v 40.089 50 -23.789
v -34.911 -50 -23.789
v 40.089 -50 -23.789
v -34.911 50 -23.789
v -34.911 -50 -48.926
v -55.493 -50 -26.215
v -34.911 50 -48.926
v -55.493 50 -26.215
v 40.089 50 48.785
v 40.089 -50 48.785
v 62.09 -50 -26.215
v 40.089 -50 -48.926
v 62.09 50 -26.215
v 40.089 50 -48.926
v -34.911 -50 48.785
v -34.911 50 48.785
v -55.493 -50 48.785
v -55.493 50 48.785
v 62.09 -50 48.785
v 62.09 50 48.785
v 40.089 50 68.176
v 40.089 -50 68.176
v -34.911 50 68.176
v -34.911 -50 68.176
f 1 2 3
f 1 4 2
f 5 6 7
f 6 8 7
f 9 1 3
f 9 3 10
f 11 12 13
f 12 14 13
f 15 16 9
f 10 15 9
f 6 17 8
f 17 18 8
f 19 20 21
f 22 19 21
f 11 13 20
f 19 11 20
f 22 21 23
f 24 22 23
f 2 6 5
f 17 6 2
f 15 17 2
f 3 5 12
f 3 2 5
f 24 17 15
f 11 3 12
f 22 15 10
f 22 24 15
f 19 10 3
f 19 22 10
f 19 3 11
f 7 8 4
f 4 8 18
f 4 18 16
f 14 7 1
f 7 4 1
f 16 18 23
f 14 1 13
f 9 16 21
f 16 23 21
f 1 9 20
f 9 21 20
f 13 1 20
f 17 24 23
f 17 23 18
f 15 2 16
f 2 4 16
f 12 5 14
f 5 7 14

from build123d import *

# Parameters (mm, degrees)
F0_W          = 75
F0_H          = 72.5740331761
F1_DEPTH      = 50
F1_DEPTH_BACK = 50


with BuildPart() as f1:
    # F0 (on Front) → F1 (new body, two sides)
    with BuildSketch(Plane.XZ) as f1_sk:
        Polygon((-34.9110340909, 68.1764709135), (-55.4926691404, 48.7848244566), (-55.4926691404, -26.2151755434), (-34.9110340909, -48.9259438893), (40.0889659091, -48.9259438893), (62.090027551, -26.2151755434), (62.090027551, 48.7848244566), (40.0889659091, 68.1764709135), align=None)
        with Locations((2.5889659091, 12.4978078685)):
            Rectangle(F0_W, F0_H, mode=Mode.SUBTRACT)
    extrude(amount=-F1_DEPTH)
    extrude(f1_sk.sketch, amount=F1_DEPTH_BACK)


solid = f1.part
